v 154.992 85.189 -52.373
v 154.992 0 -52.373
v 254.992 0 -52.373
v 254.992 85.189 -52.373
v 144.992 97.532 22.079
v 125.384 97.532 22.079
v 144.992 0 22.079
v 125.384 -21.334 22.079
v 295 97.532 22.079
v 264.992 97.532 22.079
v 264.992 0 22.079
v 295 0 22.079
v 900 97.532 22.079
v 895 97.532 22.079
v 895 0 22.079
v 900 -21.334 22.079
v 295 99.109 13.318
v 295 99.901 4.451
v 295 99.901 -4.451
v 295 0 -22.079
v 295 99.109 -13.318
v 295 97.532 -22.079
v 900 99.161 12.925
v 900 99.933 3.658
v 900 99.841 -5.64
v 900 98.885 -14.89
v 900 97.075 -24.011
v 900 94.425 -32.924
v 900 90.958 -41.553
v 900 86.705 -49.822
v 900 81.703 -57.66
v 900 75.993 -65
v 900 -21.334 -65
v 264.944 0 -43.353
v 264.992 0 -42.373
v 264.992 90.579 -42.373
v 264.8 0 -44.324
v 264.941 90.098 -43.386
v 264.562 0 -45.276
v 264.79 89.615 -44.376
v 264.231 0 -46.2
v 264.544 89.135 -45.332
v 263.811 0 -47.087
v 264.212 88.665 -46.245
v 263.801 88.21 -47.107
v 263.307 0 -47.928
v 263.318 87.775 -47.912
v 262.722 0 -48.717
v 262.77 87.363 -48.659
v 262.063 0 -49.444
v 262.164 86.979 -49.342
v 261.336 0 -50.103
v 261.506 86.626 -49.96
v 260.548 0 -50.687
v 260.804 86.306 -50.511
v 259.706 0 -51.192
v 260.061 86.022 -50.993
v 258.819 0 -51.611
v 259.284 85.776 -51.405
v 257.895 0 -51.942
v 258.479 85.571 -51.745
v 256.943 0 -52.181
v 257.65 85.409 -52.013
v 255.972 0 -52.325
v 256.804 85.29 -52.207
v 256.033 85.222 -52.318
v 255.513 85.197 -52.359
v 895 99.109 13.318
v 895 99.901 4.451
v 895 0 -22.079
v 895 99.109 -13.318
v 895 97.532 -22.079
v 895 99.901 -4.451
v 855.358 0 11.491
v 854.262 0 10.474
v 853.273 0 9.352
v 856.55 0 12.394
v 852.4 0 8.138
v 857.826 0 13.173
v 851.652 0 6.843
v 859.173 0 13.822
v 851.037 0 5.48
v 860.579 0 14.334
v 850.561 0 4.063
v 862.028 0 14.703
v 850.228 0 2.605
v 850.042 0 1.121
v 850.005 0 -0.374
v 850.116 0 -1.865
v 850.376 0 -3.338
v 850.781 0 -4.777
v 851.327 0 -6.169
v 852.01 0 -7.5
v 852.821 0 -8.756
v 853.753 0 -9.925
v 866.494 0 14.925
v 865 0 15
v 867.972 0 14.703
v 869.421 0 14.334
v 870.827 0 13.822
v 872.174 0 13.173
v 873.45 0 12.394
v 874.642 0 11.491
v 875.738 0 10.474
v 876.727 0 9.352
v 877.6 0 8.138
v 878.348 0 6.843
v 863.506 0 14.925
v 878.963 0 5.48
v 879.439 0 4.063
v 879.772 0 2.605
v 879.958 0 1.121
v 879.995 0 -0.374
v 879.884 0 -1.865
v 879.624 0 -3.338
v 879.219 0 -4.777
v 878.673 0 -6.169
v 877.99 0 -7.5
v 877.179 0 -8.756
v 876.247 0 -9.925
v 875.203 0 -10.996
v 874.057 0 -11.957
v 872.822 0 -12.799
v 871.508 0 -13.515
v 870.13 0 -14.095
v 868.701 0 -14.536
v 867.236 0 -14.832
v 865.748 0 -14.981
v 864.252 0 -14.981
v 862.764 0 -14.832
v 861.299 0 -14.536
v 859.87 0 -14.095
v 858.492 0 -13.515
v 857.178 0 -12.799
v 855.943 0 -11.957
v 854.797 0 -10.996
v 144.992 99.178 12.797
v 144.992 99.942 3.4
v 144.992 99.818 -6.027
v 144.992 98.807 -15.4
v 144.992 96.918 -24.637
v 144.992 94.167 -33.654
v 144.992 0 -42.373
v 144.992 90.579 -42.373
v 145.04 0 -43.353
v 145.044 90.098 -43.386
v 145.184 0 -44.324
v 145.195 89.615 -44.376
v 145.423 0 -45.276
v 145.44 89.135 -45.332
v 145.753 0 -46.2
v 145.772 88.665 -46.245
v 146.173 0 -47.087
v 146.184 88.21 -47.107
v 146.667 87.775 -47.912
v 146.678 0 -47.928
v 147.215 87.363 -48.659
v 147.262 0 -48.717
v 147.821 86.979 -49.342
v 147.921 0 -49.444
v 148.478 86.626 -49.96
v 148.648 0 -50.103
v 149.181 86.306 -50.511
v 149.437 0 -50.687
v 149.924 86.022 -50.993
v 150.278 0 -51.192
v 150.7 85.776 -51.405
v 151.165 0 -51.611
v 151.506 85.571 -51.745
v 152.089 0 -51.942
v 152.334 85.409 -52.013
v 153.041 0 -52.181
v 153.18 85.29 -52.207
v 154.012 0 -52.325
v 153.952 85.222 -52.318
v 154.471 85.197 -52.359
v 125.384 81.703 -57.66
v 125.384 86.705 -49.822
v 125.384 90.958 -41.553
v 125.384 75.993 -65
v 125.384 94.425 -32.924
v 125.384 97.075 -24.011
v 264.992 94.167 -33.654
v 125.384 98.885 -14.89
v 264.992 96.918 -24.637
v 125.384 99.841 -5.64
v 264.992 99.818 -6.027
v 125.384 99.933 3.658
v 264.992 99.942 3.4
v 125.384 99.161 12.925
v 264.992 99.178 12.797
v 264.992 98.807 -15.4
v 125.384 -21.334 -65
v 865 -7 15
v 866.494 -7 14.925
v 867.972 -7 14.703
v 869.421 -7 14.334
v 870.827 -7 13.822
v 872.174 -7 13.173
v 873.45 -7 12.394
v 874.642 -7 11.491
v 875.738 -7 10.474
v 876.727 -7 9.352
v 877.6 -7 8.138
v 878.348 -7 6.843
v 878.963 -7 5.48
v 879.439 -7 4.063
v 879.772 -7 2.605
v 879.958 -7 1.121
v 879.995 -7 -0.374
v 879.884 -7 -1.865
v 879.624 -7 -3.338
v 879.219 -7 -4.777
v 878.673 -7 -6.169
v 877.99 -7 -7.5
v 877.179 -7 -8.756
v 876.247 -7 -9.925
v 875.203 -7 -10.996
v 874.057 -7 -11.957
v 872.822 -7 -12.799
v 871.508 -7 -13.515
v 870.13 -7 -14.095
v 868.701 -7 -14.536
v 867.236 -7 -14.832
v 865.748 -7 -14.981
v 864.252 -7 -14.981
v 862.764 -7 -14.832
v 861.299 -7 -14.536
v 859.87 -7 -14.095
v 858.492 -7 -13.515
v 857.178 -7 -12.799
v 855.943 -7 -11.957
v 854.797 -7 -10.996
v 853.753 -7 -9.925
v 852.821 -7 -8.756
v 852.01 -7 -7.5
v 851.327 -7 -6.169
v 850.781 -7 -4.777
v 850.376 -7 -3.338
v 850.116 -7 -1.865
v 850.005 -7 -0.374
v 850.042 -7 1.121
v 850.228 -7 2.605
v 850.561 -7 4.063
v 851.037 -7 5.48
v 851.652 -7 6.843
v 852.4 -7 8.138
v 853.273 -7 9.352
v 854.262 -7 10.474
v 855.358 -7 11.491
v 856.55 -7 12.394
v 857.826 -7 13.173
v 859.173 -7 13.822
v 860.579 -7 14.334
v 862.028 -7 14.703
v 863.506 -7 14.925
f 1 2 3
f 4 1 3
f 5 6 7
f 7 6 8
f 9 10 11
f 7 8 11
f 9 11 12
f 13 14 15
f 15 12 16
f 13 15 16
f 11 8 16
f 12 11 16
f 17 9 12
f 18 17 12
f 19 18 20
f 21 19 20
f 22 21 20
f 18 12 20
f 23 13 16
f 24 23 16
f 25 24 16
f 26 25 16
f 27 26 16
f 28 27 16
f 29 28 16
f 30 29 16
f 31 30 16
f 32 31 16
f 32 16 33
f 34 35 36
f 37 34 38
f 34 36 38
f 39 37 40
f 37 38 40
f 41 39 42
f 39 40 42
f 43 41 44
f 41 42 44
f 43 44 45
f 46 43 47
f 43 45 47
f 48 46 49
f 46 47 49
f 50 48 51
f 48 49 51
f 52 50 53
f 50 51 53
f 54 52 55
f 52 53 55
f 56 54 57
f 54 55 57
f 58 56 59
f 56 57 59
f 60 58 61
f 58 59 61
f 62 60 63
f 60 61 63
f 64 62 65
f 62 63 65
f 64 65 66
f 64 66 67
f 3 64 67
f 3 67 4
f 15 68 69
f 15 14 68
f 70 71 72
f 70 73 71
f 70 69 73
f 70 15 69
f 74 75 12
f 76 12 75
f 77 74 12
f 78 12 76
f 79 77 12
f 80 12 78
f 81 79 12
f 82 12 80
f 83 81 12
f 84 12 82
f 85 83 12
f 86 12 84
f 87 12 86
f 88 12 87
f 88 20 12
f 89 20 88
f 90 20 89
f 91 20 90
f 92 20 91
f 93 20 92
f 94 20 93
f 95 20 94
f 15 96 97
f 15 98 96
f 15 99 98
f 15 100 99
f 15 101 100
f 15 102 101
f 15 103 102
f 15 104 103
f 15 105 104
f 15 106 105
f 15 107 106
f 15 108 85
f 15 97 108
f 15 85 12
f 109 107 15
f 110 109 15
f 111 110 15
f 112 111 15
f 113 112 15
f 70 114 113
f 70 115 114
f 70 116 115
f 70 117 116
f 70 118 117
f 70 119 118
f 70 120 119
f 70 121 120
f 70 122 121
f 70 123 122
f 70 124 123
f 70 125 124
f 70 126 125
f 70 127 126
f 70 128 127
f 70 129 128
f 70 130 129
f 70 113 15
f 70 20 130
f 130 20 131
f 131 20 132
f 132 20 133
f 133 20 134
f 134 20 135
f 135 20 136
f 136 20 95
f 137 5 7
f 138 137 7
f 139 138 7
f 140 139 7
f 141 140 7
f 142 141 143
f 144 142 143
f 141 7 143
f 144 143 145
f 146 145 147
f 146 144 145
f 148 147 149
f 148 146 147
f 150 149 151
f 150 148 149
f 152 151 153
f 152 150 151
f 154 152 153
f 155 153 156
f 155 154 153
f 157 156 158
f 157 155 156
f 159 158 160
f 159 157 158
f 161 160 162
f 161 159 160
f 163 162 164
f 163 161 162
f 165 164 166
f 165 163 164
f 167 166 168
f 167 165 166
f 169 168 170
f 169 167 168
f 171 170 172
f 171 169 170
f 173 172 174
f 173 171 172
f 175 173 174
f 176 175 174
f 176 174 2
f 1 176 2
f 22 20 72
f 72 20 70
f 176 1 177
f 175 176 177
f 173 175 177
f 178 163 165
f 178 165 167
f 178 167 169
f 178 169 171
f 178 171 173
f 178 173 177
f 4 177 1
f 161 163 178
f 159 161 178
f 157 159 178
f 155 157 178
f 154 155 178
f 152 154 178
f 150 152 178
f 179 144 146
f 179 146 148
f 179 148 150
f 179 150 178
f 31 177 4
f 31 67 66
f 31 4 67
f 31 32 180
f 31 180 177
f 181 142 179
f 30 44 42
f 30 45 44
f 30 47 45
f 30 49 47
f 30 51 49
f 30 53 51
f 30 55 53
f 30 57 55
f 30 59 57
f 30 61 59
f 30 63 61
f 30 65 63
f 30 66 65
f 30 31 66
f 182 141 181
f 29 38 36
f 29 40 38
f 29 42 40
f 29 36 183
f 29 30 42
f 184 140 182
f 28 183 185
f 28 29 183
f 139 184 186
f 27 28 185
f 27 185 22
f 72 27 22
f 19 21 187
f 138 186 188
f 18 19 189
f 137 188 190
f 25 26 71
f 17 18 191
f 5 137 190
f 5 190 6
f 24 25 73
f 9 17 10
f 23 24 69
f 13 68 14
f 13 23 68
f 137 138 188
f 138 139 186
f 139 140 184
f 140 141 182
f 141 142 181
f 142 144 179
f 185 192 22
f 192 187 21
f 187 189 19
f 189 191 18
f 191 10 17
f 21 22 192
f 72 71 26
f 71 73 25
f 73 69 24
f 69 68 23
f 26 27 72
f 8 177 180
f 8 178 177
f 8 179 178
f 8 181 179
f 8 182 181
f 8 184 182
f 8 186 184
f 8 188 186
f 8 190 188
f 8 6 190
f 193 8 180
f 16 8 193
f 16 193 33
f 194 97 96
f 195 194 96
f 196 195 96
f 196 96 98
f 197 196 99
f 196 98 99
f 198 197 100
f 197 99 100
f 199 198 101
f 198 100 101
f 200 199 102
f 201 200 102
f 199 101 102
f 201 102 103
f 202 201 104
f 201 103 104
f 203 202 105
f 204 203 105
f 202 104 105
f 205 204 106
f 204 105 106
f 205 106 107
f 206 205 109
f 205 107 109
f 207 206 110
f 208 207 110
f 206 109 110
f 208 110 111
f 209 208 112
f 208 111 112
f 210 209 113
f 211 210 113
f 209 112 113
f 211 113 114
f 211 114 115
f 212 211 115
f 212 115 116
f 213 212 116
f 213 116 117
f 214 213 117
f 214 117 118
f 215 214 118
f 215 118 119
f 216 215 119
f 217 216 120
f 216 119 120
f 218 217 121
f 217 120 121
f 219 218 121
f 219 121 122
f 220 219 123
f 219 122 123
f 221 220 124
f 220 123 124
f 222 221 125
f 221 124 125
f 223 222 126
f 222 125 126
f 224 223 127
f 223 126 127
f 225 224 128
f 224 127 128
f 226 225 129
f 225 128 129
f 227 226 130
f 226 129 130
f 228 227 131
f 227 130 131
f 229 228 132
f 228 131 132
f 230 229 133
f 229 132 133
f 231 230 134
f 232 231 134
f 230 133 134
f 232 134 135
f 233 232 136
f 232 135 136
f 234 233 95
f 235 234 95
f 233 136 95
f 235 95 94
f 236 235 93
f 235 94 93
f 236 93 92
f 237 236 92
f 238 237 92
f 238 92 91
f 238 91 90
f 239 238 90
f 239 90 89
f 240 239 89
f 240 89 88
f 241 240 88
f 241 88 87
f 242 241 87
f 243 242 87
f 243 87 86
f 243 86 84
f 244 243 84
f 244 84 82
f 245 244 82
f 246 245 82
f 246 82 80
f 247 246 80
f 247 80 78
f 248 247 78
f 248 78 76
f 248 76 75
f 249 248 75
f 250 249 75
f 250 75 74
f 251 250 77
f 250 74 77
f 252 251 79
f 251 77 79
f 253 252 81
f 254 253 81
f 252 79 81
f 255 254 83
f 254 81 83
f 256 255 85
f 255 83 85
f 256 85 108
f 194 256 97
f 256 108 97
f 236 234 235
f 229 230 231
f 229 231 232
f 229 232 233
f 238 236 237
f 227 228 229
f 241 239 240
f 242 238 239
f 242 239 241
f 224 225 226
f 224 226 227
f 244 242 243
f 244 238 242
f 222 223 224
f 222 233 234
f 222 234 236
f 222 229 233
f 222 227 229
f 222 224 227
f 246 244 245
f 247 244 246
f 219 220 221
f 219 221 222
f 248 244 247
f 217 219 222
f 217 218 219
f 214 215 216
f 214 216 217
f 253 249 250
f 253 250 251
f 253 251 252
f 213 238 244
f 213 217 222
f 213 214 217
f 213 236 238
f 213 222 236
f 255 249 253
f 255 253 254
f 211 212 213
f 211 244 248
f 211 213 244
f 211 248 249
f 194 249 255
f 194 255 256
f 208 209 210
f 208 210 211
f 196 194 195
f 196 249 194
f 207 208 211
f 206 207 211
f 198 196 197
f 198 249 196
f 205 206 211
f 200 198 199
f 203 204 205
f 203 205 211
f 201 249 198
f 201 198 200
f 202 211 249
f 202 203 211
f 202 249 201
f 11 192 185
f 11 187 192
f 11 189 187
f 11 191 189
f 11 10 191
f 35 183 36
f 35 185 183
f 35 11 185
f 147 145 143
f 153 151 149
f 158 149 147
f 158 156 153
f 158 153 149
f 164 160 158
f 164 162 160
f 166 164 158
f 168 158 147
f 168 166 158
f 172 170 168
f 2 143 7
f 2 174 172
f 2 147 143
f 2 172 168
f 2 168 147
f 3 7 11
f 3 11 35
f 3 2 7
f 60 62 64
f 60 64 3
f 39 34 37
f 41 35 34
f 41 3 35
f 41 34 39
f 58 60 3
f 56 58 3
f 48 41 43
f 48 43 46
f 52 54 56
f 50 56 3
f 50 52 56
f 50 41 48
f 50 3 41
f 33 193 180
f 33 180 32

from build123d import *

# Parameters (mm, degrees)
CUT_EXTRUDE7_DEPTH               = 1010.950493836
CUT_EXTRUDE7_DEPTH_BACK          = 1010.950493836
SKETCH13_W                       = 48.176434887
SKETCH13_H                       = 155.804640487
SKETCH4_W                        = 600
SKETCH4_H                        = 44.158972604
CUT_EXTRUDE2_DEPTH               = 1010.950493836
SKETCH7_W                        = 159.807953253
SKETCH7_H                        = 69.49104999
BOSS_EXTRUDE7_DEPTH              = 5
FILLET5_R                        = 10
F_5_8_0_625_DIAMETER_HOLE1_D     = 15.875
F_5_8_0_625_DIAMETER_HOLE1_DEPTH = 30
F_5_8_0_625_DIAMETER_HOLE1_TIP   = 4.769331164
BOSS_EXTRUDE8_DEPTH              = 10
BOSS_EXTRUDE8_DEPTH_BACK         = 10
SKETCH16_W                       = 57.403477863
SKETCH16_H                       = 23.203595883
SKETCH17_W                       = 38.256761469
SKETCH17_H                       = 12.64819079
BOSS_EXTRUDE9_DEPTH              = 10
SKETCH18_W                       = 120
SKETCH18_H                       = 104.74536306
CUT_EXTRUDE8_DEPTH               = 161
FILLET6_R                        = 10
SKETCH19_R                       = 15
CUT_EXTRUDE9_DEPTH               = 7
CUT_EXTRUDE11_DEPTH              = 1010.950493856
CUT_EXTRUDE11_DEPTH_BACK         = 1010.950493856
SKETCH22_W                       = 1481.455902665
SKETCH22_H                       = 524.99926461
SKETCH22_W_2                     = 774.615564444
SKETCH22_H_2                     = 130
SKETCH23_W                       = 1033.221047575
SKETCH23_H                       = 313.410359552
SKETCH23_W_2                     = 790.959514037
SKETCH23_H_2                     = 163.499719248
CUT_EXTRUDE12_DEPTH              = 915.822387207
CUT_EXTRUDE13_DEPTH              = 908.868382599
CUT_EXTRUDE13_DEPTH_BACK         = 908.868382599
SKETCH24_W                       = 774.615564444
SKETCH24_H                       = 42.920513698


# Read off the part's stored shape, not the designer's step: Revolve1
with BuildPart() as part:
    # Revolve1 outline → Revolve1 (revolve)
    with BuildSketch(Plane.YX):
        with BuildLine():
            Line((0, 1000), (0, 0))
            ThreePointArc((0, 0), (70.710678154, 29.289321917), (100, 100.0000001))
            Line((100, 100.0000001), (100, 899.9999999))
            ThreePointArc((100, 899.9999999), (70.710678154, 970.710678083), (0, 1000))
        make_face()
    revolve(axis=Axis((0, 0, 0), (1, 0, 0)))

    # Sketch13 → Cut-Extrude7 (cut, two sides: drawn at the far end of the back side and taken through both)
    with BuildSketch(Plane(origin=(0, 0, 0), x_dir=(1, 0, 0), z_dir=(0, 1, 0)).offset(-CUT_EXTRUDE7_DEPTH_BACK)):
        with Locations((5.911782557, -3.075091589)):
            Rectangle(SKETCH13_W, SKETCH13_H)
    extrude(amount=CUT_EXTRUDE7_DEPTH + CUT_EXTRUDE7_DEPTH_BACK, mode=Mode.SUBTRACT)

    # Sketch4 → Cut-Extrude2 (cut, through all)
    with BuildSketch(Plane(origin=(0, 0, 0), x_dir=(1, 0, 0), z_dir=(0, 1, 0))):
        with Locations((595, 0)):
            Rectangle(SKETCH4_W, SKETCH4_H)
    extrude(amount=CUT_EXTRUDE2_DEPTH, mode=Mode.SUBTRACT)

    # Sketch7 → Boss-Extrude7 (add)
    with BuildSketch(Plane(origin=(0, 0, 0), x_dir=(1, 0, 0), z_dir=(0, 1, 0))):
        with Locations((745.885521462, -1.405844332)):
            Rectangle(SKETCH7_W, SKETCH7_H)
    extrude(amount=-BOSS_EXTRUDE7_DEPTH)

    # Fillet5
    fillet5_edges = [part.edges().sort_by_distance(p)[0] for p in [
        (30, -71.414284286, 0),
    ]]
    fillet(fillet5_edges, radius=FILLET5_R)

    # 5/8 (0.625) Diameter Hole1
    with Locations(Plane.ZY.offset(-30)):
        with Locations((0, 0)):
            Hole(F_5_8_0_625_DIAMETER_HOLE1_D / 2, depth=F_5_8_0_625_DIAMETER_HOLE1_DEPTH)
            with Locations((0, 0, -(F_5_8_0_625_DIAMETER_HOLE1_DEPTH + F_5_8_0_625_DIAMETER_HOLE1_TIP / 2))):  # 118° drill point
                Cone(0, F_5_8_0_625_DIAMETER_HOLE1_D / 2, F_5_8_0_625_DIAMETER_HOLE1_TIP, mode=Mode.SUBTRACT)

    # Sketch16 → Boss-Extrude8 (add, two sides: drawn at the far end of the back side and taken through both)
    with BuildSketch(Plane.XY.offset(-BOSS_EXTRUDE8_DEPTH_BACK)):
        with Locations((738.294537666, -11.601797942)):
            Rectangle(SKETCH16_W, SKETCH16_H)
    extrude(amount=BOSS_EXTRUDE8_DEPTH + BOSS_EXTRUDE8_DEPTH_BACK)

    # Sketch17 → Boss-Extrude9 (add)
    with BuildSketch(Plane.XY.offset(-22.079486302)):
        with Locations((787.071835847, 6.324095395)):
            Rectangle(SKETCH17_W, SKETCH17_H)
    extrude(amount=-BOSS_EXTRUDE9_DEPTH)

    # Sketch18 → Cut-Extrude8 (cut)
    with BuildSketch(Plane(origin=(0, 0, 0), x_dir=(1, 0, 0), z_dir=(0, 1, 0))):
        with Locations((204.992275313, 0)):
            Rectangle(SKETCH18_W, SKETCH18_H)
    extrude(amount=CUT_EXTRUDE8_DEPTH, mode=Mode.SUBTRACT)

    # Fillet6
    fillet6_edges = [part.edges().sort_by_distance(p)[0] for p in [
        (144.992275313, 42.594313674, -52.37268153),
        (144.992275313, 42.594313674, 52.37268153),
        (264.992275313, 42.594313674, 52.37268153),
        (264.992275313, 42.594313674, -52.37268153),
    ]]
    fillet(fillet6_edges, radius=FILLET6_R)

    # Sketch19 → Cut-Extrude9 (cut)
    with BuildSketch(Plane(origin=(0, 0, 0), x_dir=(1, 0, 0), z_dir=(0, 1, 0))):
        with Locations(Location((865, 0, 0), (0, 0, 270))):
            Circle(SKETCH19_R)
    extrude(amount=-CUT_EXTRUDE9_DEPTH, mode=Mode.SUBTRACT)

    # Sketch22 → Cut-Extrude11 (cut, two sides: drawn at the far end of the back side and taken through both)
    with BuildSketch(Plane(origin=(0, 0, 0), x_dir=(1, 0, 0), z_dir=(0, 1, 0)).offset(-CUT_EXTRUDE11_DEPTH_BACK)):
        with Locations((406.155110175, 0)):
            Rectangle(SKETCH22_W, SKETCH22_H)
        with Locations((512.692217778, 0)):
            Rectangle(SKETCH22_W_2, SKETCH22_H_2, mode=Mode.SUBTRACT)
    extrude(amount=CUT_EXTRUDE11_DEPTH + CUT_EXTRUDE11_DEPTH_BACK, mode=Mode.SUBTRACT)

    # Sketch23 → Cut-Extrude12 (cut, through all)
    with BuildSketch(Plane.XY.offset(65)):
        with Locations((481.89787613, -1.932796335)):
            Rectangle(SKETCH23_W, SKETCH23_H)
        with Locations((520.864192575, 60.415600646)):
            Rectangle(SKETCH23_W_2, SKETCH23_H_2, mode=Mode.SUBTRACT)
    extrude(amount=-CUT_EXTRUDE12_DEPTH, mode=Mode.SUBTRACT)

    # Sketch24 → Cut-Extrude13 (cut, two sides: drawn at the far end of the back side and taken through both)
    with BuildSketch(Plane(origin=(0, 0, 0), x_dir=(1, 0, 0), z_dir=(0, 1, 0)).offset(-CUT_EXTRUDE13_DEPTH_BACK)):
        with Locations((512.692217778, -43.539743151)):
            Rectangle(SKETCH24_W, SKETCH24_H)
    extrude(amount=CUT_EXTRUDE13_DEPTH + CUT_EXTRUDE13_DEPTH_BACK, mode=Mode.SUBTRACT)


solid = part.part
